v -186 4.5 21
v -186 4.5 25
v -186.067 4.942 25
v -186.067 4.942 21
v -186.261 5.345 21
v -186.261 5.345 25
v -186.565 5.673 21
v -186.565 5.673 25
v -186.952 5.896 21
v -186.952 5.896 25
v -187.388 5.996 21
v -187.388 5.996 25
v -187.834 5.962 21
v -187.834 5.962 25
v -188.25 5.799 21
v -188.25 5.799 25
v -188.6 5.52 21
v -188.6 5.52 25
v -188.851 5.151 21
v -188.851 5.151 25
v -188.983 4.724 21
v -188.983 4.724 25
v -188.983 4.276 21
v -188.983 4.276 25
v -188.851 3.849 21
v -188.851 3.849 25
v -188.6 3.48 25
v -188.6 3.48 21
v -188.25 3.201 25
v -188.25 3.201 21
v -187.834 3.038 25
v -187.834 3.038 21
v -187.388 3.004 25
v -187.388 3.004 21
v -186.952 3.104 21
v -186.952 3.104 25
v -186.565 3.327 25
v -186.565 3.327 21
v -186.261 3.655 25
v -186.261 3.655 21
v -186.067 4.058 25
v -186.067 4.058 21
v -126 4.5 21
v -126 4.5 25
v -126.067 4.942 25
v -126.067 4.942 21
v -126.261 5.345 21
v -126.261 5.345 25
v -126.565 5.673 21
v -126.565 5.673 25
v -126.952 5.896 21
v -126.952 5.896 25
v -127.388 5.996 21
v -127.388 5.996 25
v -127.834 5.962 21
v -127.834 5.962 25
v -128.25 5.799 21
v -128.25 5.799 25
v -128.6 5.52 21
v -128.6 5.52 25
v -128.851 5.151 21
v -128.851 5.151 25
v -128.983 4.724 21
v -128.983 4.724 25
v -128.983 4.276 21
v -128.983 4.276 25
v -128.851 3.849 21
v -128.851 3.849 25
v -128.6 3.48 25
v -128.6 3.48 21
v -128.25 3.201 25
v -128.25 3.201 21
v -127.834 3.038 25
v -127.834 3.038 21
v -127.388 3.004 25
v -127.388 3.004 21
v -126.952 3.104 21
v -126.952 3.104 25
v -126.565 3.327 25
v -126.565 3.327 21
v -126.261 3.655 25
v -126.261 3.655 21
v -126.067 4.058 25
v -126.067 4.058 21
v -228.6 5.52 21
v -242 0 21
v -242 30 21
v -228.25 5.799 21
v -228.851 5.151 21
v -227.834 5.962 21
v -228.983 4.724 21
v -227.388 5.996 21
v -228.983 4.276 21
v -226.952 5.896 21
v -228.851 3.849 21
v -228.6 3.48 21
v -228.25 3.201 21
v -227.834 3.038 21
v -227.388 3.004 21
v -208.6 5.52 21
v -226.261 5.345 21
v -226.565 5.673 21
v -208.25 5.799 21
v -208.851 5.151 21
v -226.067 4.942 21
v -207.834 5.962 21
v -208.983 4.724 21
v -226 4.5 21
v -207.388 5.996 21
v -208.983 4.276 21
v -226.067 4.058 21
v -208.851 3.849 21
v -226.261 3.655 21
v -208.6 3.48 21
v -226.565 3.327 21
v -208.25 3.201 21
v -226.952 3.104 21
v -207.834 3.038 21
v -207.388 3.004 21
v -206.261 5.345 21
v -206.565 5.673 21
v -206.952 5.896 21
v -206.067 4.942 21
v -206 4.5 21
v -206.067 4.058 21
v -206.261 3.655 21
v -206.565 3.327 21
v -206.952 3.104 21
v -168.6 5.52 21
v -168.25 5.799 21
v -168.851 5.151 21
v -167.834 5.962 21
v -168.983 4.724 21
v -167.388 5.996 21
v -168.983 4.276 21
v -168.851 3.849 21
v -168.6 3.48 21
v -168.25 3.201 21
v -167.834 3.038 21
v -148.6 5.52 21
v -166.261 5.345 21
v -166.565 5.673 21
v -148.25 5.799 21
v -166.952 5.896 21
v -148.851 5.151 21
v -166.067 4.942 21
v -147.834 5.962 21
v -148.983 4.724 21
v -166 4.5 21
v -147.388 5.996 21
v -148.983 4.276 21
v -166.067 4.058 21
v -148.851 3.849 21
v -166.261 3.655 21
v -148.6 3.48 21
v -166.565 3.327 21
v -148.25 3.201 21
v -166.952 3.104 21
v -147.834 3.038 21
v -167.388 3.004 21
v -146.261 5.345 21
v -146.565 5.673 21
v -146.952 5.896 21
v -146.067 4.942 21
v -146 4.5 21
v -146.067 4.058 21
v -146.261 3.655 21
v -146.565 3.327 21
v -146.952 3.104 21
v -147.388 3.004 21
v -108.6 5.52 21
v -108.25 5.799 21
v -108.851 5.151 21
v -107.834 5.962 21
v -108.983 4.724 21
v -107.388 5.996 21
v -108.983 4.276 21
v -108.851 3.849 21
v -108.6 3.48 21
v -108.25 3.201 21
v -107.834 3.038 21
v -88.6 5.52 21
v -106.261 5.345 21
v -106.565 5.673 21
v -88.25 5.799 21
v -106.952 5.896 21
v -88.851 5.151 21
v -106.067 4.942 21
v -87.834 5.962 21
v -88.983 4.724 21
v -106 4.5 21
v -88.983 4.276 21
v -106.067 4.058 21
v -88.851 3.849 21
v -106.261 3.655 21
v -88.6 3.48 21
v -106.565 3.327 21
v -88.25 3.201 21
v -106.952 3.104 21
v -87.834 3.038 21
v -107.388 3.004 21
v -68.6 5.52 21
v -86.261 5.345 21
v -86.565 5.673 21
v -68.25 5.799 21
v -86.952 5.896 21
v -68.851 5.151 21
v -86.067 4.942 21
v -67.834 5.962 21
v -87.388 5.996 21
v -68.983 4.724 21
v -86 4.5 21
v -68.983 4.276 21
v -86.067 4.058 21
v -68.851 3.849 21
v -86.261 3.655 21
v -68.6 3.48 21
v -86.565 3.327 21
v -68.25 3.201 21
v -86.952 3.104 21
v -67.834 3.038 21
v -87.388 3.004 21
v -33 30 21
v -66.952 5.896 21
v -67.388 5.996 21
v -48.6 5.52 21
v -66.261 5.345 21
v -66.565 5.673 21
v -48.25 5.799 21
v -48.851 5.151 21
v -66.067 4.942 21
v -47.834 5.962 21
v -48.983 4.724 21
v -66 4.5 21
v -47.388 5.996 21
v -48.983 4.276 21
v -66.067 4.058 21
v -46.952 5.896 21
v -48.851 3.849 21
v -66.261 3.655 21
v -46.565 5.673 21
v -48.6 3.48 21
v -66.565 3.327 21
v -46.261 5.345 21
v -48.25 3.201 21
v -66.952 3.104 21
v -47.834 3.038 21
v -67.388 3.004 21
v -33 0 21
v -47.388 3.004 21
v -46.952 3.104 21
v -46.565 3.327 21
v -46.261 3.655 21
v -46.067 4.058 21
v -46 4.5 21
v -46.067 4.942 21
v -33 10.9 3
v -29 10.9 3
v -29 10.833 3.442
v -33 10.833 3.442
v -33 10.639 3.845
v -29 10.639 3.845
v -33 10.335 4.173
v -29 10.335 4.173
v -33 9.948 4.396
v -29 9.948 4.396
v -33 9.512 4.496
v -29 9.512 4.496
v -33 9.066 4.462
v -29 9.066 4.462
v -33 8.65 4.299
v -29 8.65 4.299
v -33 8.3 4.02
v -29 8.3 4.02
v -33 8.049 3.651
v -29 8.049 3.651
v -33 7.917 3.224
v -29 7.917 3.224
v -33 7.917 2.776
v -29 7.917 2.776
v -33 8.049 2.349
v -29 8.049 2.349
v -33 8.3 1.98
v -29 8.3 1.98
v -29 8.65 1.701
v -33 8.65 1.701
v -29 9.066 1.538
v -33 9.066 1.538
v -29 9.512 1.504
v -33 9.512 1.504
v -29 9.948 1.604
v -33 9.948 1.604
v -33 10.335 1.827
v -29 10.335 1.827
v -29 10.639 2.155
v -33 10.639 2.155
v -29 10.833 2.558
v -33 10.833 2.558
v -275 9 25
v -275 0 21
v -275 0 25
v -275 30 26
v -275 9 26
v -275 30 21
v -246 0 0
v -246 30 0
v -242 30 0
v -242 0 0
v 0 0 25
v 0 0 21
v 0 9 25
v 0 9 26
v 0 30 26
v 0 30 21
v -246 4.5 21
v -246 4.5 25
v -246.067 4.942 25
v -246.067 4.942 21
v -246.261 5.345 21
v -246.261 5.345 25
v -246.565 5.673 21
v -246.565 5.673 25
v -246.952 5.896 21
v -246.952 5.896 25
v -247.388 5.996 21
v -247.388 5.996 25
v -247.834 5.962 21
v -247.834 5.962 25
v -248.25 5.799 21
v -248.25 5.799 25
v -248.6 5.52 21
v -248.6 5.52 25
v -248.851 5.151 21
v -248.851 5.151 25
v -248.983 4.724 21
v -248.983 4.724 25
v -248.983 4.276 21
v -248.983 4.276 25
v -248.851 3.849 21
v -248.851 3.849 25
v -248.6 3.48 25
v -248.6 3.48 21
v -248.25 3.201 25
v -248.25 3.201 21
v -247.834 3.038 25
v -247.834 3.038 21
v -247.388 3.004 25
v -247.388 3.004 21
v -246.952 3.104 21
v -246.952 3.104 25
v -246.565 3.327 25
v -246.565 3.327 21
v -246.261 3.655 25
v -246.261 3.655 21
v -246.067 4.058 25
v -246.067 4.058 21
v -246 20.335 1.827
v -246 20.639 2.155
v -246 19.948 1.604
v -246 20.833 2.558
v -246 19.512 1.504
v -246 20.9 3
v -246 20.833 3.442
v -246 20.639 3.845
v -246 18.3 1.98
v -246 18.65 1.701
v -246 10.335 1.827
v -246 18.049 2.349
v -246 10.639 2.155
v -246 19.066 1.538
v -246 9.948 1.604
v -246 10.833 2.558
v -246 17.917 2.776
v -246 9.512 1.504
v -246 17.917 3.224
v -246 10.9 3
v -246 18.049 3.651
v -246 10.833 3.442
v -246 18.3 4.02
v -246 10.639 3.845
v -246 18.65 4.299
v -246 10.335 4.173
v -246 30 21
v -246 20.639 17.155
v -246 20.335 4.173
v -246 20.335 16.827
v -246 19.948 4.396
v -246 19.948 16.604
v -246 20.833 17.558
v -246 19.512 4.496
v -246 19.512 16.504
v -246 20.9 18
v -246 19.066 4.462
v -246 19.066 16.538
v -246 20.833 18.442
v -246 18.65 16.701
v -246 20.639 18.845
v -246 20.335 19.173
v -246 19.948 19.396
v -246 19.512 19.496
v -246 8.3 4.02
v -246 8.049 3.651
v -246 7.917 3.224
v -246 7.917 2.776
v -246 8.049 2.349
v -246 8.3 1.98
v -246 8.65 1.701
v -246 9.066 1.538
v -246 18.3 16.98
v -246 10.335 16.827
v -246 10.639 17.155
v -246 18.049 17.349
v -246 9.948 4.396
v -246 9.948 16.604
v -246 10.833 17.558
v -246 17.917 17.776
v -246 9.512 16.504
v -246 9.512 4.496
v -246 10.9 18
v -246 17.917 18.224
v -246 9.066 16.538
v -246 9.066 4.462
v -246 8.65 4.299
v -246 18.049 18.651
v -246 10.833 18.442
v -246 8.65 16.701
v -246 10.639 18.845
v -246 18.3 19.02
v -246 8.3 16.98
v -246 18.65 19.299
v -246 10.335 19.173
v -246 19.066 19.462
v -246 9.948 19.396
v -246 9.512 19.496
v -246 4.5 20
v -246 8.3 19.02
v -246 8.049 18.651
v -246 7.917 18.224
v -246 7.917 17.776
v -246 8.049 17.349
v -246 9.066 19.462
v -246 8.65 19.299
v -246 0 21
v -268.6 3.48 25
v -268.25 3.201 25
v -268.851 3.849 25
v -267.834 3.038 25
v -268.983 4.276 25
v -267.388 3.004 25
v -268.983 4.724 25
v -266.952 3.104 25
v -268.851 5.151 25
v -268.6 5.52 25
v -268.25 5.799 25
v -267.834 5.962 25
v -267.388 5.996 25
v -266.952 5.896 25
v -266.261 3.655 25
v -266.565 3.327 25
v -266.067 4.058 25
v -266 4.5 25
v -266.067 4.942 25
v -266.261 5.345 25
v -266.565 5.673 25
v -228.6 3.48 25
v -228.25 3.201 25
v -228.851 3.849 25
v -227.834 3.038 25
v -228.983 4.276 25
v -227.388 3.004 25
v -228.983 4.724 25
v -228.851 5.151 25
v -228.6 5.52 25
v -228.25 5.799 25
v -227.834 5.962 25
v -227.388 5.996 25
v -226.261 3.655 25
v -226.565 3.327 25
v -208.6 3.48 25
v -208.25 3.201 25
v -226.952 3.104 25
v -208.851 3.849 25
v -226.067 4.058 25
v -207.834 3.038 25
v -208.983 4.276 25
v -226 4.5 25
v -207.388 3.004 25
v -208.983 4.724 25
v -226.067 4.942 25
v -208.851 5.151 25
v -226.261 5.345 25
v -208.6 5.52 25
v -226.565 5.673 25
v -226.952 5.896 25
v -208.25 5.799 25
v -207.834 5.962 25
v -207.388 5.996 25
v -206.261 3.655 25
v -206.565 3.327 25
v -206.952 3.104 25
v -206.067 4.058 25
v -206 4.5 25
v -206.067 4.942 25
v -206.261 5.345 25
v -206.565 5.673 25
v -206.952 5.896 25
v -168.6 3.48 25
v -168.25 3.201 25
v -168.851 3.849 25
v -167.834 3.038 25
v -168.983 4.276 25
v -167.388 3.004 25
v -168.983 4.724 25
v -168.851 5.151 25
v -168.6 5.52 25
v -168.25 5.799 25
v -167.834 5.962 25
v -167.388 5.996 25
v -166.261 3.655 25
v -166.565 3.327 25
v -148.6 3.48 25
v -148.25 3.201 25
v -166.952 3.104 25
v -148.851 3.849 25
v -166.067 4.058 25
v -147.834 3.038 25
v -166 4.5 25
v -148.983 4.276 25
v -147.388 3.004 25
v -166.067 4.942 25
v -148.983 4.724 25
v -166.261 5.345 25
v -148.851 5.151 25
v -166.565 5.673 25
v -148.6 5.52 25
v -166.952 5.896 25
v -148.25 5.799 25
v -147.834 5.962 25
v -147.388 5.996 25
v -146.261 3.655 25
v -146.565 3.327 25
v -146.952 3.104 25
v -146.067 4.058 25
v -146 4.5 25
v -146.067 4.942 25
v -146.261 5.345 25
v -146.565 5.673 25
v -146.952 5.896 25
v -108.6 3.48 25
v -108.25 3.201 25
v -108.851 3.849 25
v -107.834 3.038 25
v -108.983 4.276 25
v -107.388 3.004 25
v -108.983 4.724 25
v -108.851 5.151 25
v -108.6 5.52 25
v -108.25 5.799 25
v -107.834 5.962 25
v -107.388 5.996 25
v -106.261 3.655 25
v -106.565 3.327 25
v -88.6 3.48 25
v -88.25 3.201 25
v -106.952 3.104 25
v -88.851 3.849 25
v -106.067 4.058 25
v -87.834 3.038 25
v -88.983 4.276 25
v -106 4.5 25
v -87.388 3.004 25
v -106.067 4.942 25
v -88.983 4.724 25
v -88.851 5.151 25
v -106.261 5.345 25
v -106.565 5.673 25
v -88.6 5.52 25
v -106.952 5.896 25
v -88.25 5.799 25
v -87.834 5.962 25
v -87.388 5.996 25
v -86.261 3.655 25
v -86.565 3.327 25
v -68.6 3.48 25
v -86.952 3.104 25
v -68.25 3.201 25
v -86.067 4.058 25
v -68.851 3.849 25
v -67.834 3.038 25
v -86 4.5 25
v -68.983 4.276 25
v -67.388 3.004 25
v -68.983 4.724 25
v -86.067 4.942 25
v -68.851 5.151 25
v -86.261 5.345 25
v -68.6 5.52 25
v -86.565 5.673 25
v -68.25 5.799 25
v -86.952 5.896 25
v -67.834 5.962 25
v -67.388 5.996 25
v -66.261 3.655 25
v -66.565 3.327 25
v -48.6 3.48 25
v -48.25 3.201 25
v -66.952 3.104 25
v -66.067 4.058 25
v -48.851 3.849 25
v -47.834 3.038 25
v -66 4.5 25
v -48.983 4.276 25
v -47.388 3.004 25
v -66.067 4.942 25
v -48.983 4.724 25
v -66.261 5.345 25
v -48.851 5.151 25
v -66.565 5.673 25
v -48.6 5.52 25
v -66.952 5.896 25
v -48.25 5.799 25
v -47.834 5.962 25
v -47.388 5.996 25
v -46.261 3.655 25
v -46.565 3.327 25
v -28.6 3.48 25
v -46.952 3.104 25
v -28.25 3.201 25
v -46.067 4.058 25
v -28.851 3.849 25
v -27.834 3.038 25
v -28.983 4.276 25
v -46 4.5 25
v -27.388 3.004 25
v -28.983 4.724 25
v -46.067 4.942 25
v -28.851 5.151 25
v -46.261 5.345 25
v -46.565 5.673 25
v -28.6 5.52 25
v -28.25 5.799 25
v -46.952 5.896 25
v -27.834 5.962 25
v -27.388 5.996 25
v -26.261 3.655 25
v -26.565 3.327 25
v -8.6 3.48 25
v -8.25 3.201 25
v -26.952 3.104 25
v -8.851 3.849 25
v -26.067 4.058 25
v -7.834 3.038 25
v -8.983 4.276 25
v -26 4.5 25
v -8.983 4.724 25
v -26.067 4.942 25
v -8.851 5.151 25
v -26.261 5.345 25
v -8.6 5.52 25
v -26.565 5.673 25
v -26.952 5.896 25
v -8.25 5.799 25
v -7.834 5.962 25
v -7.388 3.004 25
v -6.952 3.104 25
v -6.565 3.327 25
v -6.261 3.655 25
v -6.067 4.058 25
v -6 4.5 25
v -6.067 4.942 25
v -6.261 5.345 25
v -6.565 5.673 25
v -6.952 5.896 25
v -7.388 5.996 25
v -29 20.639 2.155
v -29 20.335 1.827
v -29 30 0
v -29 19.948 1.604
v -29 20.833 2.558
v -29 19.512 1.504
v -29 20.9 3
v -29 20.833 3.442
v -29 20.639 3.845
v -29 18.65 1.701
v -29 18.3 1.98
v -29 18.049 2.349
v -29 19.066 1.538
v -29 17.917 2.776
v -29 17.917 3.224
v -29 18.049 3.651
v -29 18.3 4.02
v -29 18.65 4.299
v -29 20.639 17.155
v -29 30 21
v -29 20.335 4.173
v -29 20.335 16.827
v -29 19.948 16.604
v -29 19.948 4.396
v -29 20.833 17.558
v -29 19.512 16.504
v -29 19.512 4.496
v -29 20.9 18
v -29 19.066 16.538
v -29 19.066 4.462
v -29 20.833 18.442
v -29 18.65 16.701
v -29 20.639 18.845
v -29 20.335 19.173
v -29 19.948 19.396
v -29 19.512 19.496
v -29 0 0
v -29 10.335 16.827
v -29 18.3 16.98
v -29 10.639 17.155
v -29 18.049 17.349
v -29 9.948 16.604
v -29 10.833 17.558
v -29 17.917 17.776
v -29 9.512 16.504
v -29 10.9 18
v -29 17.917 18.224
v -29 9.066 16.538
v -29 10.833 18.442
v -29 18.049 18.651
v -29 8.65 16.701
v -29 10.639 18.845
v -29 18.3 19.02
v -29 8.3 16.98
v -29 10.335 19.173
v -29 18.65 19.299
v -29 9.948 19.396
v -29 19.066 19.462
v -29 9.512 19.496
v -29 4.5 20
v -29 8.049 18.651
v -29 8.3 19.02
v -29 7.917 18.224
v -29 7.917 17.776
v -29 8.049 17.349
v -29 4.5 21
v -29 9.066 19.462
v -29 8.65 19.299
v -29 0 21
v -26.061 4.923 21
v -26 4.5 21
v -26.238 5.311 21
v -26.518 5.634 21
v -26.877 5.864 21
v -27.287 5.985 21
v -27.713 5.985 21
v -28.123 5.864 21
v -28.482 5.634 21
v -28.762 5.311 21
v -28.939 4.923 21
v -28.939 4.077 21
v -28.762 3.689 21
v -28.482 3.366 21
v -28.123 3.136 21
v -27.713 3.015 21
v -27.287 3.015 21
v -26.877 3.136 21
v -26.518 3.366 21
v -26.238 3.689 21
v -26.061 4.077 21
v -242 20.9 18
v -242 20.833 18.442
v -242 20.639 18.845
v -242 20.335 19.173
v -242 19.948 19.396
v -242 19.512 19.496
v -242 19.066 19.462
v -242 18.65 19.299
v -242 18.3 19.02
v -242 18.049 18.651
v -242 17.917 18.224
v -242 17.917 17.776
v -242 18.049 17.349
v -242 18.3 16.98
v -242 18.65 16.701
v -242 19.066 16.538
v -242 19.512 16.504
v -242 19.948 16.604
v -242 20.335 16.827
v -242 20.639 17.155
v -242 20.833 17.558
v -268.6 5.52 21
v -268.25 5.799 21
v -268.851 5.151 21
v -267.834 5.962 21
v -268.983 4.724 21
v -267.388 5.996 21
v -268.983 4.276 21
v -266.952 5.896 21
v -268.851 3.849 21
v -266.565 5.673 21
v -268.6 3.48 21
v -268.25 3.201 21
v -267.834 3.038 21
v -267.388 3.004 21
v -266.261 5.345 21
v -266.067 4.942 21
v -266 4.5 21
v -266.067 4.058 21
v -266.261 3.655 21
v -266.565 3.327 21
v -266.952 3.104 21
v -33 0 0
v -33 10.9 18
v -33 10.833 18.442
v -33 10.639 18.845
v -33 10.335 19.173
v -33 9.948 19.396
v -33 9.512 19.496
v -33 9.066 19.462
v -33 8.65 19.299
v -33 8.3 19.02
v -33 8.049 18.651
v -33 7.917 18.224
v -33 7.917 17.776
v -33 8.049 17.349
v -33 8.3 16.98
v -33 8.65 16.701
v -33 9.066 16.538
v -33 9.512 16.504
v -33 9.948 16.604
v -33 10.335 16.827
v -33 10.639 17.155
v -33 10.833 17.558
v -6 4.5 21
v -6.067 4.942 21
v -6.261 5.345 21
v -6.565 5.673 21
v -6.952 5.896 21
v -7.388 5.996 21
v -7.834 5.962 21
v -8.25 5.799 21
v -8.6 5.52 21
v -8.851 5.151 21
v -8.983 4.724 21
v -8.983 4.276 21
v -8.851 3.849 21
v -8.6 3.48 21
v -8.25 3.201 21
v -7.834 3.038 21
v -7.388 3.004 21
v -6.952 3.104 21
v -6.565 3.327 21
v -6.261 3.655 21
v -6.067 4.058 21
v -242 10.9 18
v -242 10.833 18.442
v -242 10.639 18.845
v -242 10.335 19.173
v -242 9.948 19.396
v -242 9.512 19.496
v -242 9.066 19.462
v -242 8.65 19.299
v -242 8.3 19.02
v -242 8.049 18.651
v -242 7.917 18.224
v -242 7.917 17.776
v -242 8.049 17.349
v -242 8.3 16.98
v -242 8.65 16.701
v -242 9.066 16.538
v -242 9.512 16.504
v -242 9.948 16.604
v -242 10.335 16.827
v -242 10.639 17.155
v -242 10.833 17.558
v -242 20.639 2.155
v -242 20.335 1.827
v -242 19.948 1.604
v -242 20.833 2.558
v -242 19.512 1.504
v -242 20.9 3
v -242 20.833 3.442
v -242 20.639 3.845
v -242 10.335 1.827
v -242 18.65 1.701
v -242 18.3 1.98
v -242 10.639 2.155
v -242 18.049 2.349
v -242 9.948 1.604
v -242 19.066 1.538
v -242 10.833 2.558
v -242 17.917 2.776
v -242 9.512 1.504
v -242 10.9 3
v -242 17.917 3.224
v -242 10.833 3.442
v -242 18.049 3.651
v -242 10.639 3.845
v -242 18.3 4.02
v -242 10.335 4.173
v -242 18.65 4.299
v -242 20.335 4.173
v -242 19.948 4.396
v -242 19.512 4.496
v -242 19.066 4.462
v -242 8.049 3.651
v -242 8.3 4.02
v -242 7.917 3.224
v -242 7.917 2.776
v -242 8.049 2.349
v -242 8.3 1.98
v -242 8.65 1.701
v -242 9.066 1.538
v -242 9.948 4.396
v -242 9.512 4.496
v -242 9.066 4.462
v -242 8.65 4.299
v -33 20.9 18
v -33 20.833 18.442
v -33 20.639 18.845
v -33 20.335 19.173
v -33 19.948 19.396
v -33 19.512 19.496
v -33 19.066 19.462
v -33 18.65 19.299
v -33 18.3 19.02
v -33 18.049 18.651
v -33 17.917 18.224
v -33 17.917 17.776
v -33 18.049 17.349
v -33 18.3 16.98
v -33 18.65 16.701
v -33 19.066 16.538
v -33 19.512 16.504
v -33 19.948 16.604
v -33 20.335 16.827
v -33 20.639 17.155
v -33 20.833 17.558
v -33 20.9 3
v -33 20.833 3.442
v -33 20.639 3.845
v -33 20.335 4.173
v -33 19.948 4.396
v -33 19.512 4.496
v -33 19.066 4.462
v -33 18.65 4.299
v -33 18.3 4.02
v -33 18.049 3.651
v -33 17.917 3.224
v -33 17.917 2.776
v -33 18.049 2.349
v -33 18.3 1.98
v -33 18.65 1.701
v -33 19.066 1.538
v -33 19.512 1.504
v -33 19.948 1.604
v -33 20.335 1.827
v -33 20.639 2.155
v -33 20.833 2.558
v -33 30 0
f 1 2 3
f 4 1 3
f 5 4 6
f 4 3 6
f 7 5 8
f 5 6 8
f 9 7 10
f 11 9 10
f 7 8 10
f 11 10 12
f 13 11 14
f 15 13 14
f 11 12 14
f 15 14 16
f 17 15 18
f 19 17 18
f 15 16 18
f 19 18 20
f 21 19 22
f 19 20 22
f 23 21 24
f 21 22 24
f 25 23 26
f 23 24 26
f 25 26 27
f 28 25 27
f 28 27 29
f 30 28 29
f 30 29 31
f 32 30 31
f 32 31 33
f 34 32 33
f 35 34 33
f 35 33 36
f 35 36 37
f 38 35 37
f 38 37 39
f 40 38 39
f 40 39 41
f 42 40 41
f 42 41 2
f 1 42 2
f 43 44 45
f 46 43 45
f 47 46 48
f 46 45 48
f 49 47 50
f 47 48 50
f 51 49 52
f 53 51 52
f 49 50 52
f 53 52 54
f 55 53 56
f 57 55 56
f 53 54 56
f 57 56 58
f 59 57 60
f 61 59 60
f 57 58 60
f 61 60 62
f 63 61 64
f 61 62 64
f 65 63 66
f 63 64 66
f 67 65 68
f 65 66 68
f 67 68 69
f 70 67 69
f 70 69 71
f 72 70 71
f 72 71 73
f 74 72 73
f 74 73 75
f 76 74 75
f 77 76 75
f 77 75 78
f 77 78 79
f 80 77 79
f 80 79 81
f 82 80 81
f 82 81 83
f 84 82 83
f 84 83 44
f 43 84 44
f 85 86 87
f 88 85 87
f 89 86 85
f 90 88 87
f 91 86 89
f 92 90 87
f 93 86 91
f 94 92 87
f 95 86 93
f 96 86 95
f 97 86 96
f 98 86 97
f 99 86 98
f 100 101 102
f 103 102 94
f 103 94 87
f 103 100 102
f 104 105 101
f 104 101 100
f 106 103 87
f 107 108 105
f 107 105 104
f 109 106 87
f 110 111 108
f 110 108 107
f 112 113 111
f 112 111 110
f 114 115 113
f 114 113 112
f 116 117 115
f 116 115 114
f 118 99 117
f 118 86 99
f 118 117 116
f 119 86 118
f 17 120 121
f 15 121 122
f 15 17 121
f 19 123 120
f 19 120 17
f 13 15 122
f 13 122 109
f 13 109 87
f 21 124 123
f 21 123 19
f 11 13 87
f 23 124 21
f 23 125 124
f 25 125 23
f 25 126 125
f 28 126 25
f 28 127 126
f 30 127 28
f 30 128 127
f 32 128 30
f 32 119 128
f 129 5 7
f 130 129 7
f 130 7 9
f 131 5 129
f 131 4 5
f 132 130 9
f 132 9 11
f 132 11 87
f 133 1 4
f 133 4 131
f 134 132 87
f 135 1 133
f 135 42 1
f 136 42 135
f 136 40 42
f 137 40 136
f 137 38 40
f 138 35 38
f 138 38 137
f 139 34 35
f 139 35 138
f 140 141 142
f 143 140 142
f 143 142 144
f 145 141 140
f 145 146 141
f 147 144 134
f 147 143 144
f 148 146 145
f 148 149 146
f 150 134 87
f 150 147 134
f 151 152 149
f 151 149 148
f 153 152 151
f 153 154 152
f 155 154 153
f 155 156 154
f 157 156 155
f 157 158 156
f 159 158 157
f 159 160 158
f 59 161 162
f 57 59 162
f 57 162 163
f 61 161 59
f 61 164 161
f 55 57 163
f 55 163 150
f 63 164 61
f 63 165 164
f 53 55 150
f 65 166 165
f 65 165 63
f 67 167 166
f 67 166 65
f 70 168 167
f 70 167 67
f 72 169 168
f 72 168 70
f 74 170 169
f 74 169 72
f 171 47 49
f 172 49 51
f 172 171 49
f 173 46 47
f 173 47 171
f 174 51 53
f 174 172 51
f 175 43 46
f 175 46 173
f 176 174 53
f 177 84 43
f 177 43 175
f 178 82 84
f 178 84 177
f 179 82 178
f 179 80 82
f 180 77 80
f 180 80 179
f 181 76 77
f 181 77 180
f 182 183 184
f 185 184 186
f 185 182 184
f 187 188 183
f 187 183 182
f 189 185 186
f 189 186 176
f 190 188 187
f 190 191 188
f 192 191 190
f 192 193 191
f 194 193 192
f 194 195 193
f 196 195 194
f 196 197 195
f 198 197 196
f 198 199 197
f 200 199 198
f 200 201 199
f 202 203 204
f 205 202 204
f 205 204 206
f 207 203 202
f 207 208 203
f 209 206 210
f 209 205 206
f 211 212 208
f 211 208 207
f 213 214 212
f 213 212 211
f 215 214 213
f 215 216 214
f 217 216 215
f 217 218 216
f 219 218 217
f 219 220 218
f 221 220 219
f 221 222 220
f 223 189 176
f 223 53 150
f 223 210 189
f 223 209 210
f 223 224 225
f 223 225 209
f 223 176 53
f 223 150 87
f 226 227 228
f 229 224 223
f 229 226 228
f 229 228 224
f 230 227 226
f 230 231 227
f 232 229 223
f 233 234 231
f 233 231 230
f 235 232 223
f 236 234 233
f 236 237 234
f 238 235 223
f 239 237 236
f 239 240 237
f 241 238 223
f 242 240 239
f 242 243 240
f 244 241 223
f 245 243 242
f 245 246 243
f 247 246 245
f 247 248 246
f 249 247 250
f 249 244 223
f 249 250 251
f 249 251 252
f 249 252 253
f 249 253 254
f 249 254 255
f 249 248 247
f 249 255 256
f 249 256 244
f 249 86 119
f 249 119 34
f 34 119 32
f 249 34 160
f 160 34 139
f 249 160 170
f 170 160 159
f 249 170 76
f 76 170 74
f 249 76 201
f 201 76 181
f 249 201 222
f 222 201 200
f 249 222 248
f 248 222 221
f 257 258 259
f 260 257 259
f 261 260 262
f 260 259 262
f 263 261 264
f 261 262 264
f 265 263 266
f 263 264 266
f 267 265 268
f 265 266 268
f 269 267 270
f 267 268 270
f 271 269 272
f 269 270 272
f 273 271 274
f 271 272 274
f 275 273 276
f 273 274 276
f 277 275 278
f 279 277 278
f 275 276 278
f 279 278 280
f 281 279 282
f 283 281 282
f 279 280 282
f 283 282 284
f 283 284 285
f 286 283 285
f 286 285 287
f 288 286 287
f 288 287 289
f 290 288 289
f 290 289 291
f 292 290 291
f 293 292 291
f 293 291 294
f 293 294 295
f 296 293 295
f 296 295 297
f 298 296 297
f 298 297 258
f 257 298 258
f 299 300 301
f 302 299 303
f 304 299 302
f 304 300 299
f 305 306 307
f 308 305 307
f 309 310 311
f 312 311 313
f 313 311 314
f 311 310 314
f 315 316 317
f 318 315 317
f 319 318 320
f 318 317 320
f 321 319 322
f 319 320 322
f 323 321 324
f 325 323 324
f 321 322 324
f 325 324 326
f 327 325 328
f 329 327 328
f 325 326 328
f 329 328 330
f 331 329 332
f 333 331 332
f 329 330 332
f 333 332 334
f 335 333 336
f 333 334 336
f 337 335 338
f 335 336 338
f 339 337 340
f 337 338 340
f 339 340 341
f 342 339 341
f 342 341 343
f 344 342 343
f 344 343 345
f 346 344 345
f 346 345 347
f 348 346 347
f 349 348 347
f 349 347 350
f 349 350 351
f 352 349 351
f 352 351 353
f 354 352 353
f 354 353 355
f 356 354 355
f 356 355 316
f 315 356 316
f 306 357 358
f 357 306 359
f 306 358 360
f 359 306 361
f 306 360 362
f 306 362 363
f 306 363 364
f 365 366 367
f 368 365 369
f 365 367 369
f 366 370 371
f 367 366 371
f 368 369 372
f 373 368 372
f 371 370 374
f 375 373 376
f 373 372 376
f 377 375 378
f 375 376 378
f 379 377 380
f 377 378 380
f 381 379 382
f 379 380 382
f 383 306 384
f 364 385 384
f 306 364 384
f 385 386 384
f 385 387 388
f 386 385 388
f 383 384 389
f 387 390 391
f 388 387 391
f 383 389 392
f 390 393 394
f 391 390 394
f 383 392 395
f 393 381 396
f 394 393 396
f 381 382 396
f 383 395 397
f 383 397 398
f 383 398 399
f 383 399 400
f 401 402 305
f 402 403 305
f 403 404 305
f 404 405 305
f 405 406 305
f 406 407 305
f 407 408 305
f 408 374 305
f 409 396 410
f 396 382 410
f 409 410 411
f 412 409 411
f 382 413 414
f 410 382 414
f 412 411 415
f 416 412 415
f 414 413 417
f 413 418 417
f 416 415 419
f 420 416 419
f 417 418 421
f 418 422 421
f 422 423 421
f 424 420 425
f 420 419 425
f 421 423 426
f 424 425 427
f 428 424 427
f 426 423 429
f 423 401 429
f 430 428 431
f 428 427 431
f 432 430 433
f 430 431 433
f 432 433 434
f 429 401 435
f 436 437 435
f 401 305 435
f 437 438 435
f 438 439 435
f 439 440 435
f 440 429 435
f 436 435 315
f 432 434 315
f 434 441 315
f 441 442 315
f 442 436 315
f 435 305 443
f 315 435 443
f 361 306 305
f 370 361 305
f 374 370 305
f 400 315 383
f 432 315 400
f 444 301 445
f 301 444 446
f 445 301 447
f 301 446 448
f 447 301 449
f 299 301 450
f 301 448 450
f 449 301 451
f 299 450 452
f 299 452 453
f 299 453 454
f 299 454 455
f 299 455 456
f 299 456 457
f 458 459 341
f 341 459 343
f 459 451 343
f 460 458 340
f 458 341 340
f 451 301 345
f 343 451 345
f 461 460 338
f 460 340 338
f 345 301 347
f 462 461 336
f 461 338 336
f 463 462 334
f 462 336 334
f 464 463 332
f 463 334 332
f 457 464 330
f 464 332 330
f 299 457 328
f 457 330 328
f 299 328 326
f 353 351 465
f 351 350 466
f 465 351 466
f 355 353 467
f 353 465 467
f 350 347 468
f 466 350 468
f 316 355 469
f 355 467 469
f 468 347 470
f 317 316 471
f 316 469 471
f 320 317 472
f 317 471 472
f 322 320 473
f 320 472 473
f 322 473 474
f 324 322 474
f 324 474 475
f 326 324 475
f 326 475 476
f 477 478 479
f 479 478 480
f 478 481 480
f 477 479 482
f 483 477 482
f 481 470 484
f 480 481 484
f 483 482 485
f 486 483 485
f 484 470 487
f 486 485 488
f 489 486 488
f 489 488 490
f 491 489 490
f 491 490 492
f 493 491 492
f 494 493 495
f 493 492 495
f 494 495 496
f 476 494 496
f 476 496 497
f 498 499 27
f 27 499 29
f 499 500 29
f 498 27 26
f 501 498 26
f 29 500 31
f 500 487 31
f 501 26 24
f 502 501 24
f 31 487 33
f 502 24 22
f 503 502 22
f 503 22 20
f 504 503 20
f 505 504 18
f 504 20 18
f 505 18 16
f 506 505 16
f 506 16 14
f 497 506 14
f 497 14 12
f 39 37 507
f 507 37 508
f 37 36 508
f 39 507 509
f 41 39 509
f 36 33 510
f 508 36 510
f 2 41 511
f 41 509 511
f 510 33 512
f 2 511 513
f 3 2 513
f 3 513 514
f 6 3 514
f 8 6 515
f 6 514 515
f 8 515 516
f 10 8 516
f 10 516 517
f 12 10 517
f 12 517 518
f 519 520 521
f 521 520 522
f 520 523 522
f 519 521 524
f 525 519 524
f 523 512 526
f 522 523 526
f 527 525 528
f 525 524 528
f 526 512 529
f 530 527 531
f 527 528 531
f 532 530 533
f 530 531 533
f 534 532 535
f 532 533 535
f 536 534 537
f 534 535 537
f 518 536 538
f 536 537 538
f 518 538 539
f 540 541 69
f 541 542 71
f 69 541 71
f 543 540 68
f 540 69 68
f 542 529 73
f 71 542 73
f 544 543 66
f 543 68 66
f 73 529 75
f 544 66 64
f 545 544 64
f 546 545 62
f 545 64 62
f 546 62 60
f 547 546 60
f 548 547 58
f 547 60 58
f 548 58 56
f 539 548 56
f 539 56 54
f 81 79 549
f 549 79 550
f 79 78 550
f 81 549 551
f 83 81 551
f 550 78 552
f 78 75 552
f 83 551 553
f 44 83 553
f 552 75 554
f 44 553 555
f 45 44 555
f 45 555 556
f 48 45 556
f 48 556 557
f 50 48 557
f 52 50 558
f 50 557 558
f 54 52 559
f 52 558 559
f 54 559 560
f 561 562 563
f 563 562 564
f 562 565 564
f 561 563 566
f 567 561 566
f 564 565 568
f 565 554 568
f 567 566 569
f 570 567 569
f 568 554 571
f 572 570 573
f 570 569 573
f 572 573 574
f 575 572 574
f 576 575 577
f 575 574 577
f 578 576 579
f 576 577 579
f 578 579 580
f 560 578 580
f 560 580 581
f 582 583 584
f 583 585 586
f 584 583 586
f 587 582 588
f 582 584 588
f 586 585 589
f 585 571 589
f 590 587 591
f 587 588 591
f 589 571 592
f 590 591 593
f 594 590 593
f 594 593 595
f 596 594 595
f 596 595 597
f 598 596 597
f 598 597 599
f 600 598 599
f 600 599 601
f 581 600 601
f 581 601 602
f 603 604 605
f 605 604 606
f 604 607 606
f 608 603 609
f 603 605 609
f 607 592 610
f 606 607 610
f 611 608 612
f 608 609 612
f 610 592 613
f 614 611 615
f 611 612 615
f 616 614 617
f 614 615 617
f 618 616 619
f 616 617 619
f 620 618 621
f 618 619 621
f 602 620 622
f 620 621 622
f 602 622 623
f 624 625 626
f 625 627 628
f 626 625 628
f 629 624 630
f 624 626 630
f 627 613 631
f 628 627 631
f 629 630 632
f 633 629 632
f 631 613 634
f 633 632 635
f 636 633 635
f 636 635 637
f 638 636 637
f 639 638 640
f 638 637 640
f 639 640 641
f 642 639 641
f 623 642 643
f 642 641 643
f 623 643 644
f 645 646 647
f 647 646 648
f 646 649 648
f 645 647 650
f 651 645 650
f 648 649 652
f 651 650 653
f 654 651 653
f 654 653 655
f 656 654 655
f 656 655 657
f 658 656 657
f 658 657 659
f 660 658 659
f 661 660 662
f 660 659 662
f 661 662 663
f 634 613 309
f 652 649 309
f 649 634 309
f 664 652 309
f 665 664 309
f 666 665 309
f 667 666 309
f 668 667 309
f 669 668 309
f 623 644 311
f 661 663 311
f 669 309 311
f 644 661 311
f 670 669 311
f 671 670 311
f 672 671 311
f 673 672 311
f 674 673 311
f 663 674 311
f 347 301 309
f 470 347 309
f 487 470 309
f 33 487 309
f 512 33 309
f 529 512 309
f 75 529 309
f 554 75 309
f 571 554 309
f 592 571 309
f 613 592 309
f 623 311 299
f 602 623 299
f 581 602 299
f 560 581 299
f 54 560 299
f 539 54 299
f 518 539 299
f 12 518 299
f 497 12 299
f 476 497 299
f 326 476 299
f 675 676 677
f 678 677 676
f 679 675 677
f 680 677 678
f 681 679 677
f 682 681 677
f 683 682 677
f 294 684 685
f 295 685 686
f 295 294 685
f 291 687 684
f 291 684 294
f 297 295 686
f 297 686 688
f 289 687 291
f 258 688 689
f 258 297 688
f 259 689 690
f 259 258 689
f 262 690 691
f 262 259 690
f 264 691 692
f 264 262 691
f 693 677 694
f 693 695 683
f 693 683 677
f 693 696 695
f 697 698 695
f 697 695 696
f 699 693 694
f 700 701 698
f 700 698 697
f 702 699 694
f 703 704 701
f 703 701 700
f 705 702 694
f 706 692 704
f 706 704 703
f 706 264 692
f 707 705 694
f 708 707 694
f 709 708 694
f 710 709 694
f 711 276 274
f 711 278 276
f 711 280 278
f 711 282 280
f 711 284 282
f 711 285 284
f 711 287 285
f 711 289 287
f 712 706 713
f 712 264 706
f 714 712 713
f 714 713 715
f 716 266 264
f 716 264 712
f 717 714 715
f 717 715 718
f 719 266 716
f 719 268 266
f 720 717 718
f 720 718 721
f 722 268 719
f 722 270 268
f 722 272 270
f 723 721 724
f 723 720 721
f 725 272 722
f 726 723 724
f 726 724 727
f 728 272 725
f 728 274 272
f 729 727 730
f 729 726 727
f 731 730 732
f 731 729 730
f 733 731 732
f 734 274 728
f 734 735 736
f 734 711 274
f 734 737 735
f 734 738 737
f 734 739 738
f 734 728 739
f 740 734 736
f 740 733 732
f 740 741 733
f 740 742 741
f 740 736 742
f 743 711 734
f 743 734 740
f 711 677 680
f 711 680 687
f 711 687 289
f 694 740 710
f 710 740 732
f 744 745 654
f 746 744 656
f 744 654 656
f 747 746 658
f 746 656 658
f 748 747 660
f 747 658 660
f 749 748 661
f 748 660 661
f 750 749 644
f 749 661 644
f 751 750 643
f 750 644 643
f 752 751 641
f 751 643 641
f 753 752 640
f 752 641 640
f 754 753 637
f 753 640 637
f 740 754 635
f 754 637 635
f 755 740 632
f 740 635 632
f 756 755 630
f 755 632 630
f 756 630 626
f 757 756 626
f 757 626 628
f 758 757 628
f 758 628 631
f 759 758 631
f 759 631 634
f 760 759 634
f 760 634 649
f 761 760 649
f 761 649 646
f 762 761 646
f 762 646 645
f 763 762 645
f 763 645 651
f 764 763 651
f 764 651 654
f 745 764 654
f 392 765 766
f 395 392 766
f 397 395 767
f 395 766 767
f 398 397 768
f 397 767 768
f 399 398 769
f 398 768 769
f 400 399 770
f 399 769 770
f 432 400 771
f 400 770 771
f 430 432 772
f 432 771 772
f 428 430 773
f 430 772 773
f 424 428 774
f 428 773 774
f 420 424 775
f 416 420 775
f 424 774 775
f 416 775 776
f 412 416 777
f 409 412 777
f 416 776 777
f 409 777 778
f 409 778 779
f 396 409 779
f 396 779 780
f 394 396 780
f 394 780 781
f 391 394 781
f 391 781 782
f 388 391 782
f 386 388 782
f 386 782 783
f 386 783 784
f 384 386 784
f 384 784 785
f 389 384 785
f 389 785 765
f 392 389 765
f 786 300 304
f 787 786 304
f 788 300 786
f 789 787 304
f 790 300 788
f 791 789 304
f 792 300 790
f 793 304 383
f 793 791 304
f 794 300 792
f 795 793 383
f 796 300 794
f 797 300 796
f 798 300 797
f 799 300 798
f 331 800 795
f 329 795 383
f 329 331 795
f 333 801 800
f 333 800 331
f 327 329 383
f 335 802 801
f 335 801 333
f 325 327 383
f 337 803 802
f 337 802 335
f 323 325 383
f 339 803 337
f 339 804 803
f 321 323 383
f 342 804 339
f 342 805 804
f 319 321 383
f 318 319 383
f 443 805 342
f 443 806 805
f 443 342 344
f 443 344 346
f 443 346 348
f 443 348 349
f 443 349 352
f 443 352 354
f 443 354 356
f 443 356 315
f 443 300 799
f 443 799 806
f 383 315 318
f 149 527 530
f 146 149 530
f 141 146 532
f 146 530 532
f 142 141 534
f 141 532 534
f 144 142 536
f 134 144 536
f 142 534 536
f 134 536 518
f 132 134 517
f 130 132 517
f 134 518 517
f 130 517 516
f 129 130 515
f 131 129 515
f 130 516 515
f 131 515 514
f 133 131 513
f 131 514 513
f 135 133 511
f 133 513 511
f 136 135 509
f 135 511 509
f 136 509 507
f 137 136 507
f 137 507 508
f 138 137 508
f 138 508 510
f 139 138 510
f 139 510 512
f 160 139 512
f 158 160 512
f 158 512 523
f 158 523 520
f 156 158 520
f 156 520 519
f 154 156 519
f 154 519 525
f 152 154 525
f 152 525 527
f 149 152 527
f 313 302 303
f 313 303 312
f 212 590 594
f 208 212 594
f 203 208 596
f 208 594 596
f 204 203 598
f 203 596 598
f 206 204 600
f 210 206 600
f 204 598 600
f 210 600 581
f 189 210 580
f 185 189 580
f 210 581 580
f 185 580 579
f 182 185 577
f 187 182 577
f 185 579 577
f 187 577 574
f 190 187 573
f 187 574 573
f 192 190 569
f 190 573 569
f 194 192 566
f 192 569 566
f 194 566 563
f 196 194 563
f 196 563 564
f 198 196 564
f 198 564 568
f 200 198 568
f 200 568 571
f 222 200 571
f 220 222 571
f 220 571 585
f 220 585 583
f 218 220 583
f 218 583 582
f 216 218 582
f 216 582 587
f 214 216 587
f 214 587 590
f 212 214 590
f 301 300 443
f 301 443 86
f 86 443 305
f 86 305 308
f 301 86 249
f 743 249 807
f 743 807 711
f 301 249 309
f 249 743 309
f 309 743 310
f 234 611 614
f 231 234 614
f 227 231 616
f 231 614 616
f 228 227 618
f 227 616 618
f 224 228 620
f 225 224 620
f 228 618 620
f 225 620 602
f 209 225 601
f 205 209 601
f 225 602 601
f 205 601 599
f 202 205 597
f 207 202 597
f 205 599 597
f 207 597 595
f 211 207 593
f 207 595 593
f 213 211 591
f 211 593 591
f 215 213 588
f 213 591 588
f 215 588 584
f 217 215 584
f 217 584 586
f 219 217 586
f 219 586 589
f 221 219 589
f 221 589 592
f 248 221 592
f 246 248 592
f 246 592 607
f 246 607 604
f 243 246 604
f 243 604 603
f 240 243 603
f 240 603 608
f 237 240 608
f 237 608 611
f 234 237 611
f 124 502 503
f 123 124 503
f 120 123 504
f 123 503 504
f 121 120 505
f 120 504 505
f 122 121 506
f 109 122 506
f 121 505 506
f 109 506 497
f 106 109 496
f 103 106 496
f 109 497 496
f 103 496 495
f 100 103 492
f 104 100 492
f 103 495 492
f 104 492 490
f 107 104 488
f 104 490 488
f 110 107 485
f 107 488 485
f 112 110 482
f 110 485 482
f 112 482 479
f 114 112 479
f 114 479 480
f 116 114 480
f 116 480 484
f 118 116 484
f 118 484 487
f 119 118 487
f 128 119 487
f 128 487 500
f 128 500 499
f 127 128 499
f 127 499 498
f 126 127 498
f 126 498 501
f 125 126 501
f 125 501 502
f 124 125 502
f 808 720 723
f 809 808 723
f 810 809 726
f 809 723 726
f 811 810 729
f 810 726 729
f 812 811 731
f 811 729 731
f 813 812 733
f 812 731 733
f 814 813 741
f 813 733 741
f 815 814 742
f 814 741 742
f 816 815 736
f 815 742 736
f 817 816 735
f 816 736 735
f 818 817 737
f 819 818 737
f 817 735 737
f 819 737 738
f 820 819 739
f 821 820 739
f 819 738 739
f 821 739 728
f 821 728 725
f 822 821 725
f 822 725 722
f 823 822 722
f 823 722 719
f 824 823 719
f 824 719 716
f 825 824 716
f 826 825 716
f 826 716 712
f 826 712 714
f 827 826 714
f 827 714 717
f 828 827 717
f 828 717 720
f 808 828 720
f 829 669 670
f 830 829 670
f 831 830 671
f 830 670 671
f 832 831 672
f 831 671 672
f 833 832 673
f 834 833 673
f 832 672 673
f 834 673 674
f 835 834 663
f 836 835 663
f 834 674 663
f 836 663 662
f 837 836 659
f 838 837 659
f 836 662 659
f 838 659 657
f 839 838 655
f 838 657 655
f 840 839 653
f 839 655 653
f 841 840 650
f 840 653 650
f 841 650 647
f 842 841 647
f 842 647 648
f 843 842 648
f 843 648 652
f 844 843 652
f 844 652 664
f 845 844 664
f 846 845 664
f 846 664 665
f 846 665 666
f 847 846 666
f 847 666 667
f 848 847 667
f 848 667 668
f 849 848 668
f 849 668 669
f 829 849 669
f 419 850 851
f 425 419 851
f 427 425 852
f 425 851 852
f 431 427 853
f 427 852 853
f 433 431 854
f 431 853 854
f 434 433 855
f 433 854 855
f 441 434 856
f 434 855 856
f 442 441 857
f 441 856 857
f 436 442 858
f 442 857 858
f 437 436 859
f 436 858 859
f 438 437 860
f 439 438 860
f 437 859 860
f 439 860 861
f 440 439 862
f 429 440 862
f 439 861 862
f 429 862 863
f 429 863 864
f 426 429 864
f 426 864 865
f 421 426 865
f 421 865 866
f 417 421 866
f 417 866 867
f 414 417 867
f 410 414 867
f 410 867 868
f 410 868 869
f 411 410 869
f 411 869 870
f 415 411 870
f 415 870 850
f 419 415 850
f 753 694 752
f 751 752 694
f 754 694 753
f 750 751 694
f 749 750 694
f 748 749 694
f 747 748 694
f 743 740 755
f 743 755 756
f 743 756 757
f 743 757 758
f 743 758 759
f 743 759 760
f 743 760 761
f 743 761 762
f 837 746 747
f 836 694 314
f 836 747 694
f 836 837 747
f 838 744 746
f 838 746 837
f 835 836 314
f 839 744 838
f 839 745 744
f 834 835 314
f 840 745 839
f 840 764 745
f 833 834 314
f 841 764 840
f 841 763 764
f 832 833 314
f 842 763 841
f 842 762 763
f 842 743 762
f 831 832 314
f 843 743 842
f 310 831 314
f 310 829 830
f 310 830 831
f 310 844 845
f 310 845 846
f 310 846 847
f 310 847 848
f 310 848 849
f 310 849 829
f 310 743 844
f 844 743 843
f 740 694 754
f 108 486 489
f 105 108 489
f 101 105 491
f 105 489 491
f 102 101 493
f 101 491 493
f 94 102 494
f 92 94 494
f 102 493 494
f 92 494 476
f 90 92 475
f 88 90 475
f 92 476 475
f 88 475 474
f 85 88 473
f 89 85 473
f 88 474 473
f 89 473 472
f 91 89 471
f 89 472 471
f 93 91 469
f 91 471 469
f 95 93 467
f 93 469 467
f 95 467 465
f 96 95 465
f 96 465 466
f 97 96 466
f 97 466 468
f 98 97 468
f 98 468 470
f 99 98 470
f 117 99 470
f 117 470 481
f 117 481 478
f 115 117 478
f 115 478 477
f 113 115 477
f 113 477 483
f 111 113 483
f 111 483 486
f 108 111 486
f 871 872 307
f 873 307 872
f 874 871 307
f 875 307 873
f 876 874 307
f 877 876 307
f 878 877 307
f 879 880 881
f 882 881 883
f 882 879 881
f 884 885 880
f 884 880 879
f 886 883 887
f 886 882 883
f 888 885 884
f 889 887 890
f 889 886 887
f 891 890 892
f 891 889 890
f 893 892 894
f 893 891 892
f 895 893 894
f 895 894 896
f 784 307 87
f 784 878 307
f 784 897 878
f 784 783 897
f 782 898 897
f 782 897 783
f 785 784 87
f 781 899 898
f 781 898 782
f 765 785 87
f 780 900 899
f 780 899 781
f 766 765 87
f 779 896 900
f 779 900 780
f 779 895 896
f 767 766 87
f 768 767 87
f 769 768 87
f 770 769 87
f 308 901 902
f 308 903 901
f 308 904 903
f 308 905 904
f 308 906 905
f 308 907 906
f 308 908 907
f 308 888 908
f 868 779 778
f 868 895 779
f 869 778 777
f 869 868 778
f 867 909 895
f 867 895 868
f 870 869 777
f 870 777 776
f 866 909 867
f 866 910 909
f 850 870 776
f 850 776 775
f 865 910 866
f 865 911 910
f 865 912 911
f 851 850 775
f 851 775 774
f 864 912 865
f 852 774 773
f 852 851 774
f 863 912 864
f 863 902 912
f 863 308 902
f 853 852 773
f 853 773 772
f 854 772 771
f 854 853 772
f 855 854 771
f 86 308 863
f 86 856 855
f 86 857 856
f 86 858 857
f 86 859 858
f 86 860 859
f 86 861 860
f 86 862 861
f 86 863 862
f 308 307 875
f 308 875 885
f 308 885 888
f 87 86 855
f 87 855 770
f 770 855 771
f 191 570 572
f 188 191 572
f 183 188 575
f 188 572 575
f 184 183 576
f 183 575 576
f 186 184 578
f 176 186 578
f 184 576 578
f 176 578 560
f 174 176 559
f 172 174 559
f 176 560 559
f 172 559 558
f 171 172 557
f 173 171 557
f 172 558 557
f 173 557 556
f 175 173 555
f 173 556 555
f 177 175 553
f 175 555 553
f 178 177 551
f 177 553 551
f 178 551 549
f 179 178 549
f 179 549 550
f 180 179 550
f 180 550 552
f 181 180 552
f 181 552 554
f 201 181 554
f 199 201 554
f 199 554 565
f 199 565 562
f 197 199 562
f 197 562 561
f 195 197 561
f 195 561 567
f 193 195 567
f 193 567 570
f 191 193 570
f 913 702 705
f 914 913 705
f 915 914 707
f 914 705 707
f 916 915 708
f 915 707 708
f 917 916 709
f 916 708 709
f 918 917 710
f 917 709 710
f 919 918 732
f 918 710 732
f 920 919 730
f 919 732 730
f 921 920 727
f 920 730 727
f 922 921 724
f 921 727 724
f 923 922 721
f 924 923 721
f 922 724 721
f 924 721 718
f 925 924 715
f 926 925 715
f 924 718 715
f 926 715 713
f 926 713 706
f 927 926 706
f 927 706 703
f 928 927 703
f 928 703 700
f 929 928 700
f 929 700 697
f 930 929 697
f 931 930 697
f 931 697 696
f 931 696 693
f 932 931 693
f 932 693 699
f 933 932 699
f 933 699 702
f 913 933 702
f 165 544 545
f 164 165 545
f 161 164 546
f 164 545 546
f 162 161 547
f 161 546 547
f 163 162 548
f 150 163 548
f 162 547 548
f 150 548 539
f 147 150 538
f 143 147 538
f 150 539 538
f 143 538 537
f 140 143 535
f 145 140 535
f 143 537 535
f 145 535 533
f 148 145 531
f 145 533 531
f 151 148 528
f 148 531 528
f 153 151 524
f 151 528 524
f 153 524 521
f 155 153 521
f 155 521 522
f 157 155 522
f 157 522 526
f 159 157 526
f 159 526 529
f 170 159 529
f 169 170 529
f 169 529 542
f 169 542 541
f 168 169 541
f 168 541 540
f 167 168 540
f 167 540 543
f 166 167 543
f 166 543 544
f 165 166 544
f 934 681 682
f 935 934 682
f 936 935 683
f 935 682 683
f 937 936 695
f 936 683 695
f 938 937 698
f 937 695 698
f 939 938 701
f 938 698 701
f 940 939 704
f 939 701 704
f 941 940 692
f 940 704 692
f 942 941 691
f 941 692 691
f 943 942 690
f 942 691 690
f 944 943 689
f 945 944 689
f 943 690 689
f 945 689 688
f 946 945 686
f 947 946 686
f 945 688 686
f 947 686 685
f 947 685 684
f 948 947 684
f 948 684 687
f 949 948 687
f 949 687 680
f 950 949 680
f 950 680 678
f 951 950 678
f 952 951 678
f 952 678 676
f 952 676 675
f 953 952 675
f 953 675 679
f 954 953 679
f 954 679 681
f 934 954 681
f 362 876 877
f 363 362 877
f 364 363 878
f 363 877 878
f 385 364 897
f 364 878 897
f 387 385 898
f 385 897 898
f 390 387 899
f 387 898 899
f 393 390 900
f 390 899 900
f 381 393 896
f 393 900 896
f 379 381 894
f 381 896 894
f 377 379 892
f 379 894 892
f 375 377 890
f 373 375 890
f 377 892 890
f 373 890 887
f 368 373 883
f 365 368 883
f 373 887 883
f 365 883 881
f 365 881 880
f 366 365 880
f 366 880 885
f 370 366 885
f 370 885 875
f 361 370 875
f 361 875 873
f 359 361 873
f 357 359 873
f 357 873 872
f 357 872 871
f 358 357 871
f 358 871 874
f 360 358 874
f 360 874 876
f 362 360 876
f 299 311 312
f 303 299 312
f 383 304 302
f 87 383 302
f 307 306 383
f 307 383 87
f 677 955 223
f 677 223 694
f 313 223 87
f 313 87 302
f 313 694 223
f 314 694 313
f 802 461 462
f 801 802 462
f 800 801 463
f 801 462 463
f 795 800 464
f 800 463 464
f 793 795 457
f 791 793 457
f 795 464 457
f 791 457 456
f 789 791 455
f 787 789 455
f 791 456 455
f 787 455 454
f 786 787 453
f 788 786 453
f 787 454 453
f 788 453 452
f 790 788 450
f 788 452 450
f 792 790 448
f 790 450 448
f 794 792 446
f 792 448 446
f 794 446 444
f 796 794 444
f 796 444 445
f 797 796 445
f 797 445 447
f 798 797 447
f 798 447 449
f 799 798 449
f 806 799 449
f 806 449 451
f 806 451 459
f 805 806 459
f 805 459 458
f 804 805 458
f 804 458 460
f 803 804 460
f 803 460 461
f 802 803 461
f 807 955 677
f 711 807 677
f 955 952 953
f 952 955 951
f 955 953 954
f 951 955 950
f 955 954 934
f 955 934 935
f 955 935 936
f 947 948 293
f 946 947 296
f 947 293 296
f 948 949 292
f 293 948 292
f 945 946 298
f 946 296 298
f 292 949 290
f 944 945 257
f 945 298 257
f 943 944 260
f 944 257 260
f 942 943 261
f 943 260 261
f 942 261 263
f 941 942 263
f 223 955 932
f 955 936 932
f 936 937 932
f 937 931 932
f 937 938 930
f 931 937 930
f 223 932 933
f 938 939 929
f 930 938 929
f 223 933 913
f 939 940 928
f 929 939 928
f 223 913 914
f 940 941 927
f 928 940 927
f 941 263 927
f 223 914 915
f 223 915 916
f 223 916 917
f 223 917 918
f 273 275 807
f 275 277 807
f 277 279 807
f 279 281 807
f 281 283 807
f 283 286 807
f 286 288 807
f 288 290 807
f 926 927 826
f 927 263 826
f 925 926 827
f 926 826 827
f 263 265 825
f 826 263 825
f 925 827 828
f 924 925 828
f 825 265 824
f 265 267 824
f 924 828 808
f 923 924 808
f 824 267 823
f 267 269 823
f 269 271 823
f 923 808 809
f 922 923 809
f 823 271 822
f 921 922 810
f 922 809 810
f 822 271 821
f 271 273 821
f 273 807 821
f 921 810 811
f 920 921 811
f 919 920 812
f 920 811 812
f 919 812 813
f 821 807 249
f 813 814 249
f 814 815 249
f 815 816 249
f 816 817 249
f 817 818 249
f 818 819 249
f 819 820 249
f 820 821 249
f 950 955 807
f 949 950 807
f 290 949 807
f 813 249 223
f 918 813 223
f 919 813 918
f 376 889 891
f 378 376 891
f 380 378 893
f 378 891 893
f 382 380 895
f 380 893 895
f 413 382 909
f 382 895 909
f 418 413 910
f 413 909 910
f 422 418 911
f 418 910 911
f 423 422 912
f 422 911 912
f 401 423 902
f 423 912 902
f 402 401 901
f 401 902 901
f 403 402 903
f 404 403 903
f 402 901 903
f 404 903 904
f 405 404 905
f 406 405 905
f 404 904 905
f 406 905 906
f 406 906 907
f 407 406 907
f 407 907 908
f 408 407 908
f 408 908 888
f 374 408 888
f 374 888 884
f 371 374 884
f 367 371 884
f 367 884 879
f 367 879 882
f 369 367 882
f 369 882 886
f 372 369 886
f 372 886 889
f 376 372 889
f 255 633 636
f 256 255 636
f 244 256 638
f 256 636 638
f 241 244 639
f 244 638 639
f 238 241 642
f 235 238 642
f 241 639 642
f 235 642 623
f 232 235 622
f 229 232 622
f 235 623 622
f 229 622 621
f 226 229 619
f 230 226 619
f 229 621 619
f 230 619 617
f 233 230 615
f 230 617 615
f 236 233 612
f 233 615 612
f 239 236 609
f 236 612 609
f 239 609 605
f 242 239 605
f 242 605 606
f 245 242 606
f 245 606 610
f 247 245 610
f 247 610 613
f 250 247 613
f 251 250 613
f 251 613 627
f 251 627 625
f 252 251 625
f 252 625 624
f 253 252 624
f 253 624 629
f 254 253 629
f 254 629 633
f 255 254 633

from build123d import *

# Parameters (mm, degrees)
SKETCH007_W            = 275
SKETCH007_H            = 30
PAD003_DEPTH           = 26
SKETCH008_W            = 9
SKETCH008_H            = 1
POCKET004_DEPTH        = 275
SKETCH009_R            = 1.5
POCKET005_DEPTH        = 6
LINEARPATTERN001_COUNT = 14
LINEARPATTERN001_PITCH = 20
SKETCH017_W            = 29
SKETCH017_H            = 21
SKETCH017_W_2          = 209
POCKET010_DEPTH        = 30
SKETCH018_R            = 1.5
POCKET011_DEPTH        = 275


with BuildPart() as part:
    # Sketch007 → Pad003 (new body)
    with BuildSketch(Plane.XY):
        with Locations((-137.5, 15)):
            Rectangle(SKETCH007_W, SKETCH007_H)
    extrude(amount=PAD003_DEPTH)

    # Sketch008 (on Face2 of Pad003) → Pocket004 (cut)
    with BuildSketch(Plane.YZ):
        with Locations((4.5, 25.5)):
            Rectangle(SKETCH008_W, SKETCH008_H)
    extrude(amount=-POCKET004_DEPTH, mode=Mode.SUBTRACT)

    # Sketch009 (on Face5 of Pocket004) → Pocket005 (cut)
    with BuildSketch(Plane.XY.offset(26)):
        with Locations((-7.5, 4.5)):
            Circle(SKETCH009_R)
    pocket005 = extrude(amount=-POCKET005_DEPTH, mode=Mode.SUBTRACT)

    # LinearPattern001: Pocket005 ×14
    with Locations(*[(-i * LINEARPATTERN001_PITCH, 0, 0) for i in range(1, LINEARPATTERN001_COUNT)]):
        add(pocket005, mode=Mode.SUBTRACT)

    # Sketch017 → Pocket010 (cut)
    with BuildSketch(Plane.XZ):
        with Locations((-14.5, 10.5)):
            Rectangle(SKETCH017_W, SKETCH017_H)
        with Locations((-260.5, 10.5)):
            Rectangle(SKETCH017_W, SKETCH017_H)
        with Locations((-137.5, 10.5)):
            Rectangle(SKETCH017_W_2, SKETCH017_H)
    extrude(amount=-POCKET010_DEPTH, mode=Mode.SUBTRACT)

    # Sketch018 → Pocket011 (cut)
    with BuildSketch(Plane.YZ):
        with Locations((9.4, 18)):
            Circle(SKETCH018_R)
        with Locations((19.4, 18)):
            Circle(SKETCH018_R)
        with Locations((9.4, 3)):
            Circle(SKETCH018_R)
        with Locations((19.4, 3)):
            Circle(SKETCH018_R)
    extrude(amount=-POCKET011_DEPTH, mode=Mode.SUBTRACT)


solid = part.part
